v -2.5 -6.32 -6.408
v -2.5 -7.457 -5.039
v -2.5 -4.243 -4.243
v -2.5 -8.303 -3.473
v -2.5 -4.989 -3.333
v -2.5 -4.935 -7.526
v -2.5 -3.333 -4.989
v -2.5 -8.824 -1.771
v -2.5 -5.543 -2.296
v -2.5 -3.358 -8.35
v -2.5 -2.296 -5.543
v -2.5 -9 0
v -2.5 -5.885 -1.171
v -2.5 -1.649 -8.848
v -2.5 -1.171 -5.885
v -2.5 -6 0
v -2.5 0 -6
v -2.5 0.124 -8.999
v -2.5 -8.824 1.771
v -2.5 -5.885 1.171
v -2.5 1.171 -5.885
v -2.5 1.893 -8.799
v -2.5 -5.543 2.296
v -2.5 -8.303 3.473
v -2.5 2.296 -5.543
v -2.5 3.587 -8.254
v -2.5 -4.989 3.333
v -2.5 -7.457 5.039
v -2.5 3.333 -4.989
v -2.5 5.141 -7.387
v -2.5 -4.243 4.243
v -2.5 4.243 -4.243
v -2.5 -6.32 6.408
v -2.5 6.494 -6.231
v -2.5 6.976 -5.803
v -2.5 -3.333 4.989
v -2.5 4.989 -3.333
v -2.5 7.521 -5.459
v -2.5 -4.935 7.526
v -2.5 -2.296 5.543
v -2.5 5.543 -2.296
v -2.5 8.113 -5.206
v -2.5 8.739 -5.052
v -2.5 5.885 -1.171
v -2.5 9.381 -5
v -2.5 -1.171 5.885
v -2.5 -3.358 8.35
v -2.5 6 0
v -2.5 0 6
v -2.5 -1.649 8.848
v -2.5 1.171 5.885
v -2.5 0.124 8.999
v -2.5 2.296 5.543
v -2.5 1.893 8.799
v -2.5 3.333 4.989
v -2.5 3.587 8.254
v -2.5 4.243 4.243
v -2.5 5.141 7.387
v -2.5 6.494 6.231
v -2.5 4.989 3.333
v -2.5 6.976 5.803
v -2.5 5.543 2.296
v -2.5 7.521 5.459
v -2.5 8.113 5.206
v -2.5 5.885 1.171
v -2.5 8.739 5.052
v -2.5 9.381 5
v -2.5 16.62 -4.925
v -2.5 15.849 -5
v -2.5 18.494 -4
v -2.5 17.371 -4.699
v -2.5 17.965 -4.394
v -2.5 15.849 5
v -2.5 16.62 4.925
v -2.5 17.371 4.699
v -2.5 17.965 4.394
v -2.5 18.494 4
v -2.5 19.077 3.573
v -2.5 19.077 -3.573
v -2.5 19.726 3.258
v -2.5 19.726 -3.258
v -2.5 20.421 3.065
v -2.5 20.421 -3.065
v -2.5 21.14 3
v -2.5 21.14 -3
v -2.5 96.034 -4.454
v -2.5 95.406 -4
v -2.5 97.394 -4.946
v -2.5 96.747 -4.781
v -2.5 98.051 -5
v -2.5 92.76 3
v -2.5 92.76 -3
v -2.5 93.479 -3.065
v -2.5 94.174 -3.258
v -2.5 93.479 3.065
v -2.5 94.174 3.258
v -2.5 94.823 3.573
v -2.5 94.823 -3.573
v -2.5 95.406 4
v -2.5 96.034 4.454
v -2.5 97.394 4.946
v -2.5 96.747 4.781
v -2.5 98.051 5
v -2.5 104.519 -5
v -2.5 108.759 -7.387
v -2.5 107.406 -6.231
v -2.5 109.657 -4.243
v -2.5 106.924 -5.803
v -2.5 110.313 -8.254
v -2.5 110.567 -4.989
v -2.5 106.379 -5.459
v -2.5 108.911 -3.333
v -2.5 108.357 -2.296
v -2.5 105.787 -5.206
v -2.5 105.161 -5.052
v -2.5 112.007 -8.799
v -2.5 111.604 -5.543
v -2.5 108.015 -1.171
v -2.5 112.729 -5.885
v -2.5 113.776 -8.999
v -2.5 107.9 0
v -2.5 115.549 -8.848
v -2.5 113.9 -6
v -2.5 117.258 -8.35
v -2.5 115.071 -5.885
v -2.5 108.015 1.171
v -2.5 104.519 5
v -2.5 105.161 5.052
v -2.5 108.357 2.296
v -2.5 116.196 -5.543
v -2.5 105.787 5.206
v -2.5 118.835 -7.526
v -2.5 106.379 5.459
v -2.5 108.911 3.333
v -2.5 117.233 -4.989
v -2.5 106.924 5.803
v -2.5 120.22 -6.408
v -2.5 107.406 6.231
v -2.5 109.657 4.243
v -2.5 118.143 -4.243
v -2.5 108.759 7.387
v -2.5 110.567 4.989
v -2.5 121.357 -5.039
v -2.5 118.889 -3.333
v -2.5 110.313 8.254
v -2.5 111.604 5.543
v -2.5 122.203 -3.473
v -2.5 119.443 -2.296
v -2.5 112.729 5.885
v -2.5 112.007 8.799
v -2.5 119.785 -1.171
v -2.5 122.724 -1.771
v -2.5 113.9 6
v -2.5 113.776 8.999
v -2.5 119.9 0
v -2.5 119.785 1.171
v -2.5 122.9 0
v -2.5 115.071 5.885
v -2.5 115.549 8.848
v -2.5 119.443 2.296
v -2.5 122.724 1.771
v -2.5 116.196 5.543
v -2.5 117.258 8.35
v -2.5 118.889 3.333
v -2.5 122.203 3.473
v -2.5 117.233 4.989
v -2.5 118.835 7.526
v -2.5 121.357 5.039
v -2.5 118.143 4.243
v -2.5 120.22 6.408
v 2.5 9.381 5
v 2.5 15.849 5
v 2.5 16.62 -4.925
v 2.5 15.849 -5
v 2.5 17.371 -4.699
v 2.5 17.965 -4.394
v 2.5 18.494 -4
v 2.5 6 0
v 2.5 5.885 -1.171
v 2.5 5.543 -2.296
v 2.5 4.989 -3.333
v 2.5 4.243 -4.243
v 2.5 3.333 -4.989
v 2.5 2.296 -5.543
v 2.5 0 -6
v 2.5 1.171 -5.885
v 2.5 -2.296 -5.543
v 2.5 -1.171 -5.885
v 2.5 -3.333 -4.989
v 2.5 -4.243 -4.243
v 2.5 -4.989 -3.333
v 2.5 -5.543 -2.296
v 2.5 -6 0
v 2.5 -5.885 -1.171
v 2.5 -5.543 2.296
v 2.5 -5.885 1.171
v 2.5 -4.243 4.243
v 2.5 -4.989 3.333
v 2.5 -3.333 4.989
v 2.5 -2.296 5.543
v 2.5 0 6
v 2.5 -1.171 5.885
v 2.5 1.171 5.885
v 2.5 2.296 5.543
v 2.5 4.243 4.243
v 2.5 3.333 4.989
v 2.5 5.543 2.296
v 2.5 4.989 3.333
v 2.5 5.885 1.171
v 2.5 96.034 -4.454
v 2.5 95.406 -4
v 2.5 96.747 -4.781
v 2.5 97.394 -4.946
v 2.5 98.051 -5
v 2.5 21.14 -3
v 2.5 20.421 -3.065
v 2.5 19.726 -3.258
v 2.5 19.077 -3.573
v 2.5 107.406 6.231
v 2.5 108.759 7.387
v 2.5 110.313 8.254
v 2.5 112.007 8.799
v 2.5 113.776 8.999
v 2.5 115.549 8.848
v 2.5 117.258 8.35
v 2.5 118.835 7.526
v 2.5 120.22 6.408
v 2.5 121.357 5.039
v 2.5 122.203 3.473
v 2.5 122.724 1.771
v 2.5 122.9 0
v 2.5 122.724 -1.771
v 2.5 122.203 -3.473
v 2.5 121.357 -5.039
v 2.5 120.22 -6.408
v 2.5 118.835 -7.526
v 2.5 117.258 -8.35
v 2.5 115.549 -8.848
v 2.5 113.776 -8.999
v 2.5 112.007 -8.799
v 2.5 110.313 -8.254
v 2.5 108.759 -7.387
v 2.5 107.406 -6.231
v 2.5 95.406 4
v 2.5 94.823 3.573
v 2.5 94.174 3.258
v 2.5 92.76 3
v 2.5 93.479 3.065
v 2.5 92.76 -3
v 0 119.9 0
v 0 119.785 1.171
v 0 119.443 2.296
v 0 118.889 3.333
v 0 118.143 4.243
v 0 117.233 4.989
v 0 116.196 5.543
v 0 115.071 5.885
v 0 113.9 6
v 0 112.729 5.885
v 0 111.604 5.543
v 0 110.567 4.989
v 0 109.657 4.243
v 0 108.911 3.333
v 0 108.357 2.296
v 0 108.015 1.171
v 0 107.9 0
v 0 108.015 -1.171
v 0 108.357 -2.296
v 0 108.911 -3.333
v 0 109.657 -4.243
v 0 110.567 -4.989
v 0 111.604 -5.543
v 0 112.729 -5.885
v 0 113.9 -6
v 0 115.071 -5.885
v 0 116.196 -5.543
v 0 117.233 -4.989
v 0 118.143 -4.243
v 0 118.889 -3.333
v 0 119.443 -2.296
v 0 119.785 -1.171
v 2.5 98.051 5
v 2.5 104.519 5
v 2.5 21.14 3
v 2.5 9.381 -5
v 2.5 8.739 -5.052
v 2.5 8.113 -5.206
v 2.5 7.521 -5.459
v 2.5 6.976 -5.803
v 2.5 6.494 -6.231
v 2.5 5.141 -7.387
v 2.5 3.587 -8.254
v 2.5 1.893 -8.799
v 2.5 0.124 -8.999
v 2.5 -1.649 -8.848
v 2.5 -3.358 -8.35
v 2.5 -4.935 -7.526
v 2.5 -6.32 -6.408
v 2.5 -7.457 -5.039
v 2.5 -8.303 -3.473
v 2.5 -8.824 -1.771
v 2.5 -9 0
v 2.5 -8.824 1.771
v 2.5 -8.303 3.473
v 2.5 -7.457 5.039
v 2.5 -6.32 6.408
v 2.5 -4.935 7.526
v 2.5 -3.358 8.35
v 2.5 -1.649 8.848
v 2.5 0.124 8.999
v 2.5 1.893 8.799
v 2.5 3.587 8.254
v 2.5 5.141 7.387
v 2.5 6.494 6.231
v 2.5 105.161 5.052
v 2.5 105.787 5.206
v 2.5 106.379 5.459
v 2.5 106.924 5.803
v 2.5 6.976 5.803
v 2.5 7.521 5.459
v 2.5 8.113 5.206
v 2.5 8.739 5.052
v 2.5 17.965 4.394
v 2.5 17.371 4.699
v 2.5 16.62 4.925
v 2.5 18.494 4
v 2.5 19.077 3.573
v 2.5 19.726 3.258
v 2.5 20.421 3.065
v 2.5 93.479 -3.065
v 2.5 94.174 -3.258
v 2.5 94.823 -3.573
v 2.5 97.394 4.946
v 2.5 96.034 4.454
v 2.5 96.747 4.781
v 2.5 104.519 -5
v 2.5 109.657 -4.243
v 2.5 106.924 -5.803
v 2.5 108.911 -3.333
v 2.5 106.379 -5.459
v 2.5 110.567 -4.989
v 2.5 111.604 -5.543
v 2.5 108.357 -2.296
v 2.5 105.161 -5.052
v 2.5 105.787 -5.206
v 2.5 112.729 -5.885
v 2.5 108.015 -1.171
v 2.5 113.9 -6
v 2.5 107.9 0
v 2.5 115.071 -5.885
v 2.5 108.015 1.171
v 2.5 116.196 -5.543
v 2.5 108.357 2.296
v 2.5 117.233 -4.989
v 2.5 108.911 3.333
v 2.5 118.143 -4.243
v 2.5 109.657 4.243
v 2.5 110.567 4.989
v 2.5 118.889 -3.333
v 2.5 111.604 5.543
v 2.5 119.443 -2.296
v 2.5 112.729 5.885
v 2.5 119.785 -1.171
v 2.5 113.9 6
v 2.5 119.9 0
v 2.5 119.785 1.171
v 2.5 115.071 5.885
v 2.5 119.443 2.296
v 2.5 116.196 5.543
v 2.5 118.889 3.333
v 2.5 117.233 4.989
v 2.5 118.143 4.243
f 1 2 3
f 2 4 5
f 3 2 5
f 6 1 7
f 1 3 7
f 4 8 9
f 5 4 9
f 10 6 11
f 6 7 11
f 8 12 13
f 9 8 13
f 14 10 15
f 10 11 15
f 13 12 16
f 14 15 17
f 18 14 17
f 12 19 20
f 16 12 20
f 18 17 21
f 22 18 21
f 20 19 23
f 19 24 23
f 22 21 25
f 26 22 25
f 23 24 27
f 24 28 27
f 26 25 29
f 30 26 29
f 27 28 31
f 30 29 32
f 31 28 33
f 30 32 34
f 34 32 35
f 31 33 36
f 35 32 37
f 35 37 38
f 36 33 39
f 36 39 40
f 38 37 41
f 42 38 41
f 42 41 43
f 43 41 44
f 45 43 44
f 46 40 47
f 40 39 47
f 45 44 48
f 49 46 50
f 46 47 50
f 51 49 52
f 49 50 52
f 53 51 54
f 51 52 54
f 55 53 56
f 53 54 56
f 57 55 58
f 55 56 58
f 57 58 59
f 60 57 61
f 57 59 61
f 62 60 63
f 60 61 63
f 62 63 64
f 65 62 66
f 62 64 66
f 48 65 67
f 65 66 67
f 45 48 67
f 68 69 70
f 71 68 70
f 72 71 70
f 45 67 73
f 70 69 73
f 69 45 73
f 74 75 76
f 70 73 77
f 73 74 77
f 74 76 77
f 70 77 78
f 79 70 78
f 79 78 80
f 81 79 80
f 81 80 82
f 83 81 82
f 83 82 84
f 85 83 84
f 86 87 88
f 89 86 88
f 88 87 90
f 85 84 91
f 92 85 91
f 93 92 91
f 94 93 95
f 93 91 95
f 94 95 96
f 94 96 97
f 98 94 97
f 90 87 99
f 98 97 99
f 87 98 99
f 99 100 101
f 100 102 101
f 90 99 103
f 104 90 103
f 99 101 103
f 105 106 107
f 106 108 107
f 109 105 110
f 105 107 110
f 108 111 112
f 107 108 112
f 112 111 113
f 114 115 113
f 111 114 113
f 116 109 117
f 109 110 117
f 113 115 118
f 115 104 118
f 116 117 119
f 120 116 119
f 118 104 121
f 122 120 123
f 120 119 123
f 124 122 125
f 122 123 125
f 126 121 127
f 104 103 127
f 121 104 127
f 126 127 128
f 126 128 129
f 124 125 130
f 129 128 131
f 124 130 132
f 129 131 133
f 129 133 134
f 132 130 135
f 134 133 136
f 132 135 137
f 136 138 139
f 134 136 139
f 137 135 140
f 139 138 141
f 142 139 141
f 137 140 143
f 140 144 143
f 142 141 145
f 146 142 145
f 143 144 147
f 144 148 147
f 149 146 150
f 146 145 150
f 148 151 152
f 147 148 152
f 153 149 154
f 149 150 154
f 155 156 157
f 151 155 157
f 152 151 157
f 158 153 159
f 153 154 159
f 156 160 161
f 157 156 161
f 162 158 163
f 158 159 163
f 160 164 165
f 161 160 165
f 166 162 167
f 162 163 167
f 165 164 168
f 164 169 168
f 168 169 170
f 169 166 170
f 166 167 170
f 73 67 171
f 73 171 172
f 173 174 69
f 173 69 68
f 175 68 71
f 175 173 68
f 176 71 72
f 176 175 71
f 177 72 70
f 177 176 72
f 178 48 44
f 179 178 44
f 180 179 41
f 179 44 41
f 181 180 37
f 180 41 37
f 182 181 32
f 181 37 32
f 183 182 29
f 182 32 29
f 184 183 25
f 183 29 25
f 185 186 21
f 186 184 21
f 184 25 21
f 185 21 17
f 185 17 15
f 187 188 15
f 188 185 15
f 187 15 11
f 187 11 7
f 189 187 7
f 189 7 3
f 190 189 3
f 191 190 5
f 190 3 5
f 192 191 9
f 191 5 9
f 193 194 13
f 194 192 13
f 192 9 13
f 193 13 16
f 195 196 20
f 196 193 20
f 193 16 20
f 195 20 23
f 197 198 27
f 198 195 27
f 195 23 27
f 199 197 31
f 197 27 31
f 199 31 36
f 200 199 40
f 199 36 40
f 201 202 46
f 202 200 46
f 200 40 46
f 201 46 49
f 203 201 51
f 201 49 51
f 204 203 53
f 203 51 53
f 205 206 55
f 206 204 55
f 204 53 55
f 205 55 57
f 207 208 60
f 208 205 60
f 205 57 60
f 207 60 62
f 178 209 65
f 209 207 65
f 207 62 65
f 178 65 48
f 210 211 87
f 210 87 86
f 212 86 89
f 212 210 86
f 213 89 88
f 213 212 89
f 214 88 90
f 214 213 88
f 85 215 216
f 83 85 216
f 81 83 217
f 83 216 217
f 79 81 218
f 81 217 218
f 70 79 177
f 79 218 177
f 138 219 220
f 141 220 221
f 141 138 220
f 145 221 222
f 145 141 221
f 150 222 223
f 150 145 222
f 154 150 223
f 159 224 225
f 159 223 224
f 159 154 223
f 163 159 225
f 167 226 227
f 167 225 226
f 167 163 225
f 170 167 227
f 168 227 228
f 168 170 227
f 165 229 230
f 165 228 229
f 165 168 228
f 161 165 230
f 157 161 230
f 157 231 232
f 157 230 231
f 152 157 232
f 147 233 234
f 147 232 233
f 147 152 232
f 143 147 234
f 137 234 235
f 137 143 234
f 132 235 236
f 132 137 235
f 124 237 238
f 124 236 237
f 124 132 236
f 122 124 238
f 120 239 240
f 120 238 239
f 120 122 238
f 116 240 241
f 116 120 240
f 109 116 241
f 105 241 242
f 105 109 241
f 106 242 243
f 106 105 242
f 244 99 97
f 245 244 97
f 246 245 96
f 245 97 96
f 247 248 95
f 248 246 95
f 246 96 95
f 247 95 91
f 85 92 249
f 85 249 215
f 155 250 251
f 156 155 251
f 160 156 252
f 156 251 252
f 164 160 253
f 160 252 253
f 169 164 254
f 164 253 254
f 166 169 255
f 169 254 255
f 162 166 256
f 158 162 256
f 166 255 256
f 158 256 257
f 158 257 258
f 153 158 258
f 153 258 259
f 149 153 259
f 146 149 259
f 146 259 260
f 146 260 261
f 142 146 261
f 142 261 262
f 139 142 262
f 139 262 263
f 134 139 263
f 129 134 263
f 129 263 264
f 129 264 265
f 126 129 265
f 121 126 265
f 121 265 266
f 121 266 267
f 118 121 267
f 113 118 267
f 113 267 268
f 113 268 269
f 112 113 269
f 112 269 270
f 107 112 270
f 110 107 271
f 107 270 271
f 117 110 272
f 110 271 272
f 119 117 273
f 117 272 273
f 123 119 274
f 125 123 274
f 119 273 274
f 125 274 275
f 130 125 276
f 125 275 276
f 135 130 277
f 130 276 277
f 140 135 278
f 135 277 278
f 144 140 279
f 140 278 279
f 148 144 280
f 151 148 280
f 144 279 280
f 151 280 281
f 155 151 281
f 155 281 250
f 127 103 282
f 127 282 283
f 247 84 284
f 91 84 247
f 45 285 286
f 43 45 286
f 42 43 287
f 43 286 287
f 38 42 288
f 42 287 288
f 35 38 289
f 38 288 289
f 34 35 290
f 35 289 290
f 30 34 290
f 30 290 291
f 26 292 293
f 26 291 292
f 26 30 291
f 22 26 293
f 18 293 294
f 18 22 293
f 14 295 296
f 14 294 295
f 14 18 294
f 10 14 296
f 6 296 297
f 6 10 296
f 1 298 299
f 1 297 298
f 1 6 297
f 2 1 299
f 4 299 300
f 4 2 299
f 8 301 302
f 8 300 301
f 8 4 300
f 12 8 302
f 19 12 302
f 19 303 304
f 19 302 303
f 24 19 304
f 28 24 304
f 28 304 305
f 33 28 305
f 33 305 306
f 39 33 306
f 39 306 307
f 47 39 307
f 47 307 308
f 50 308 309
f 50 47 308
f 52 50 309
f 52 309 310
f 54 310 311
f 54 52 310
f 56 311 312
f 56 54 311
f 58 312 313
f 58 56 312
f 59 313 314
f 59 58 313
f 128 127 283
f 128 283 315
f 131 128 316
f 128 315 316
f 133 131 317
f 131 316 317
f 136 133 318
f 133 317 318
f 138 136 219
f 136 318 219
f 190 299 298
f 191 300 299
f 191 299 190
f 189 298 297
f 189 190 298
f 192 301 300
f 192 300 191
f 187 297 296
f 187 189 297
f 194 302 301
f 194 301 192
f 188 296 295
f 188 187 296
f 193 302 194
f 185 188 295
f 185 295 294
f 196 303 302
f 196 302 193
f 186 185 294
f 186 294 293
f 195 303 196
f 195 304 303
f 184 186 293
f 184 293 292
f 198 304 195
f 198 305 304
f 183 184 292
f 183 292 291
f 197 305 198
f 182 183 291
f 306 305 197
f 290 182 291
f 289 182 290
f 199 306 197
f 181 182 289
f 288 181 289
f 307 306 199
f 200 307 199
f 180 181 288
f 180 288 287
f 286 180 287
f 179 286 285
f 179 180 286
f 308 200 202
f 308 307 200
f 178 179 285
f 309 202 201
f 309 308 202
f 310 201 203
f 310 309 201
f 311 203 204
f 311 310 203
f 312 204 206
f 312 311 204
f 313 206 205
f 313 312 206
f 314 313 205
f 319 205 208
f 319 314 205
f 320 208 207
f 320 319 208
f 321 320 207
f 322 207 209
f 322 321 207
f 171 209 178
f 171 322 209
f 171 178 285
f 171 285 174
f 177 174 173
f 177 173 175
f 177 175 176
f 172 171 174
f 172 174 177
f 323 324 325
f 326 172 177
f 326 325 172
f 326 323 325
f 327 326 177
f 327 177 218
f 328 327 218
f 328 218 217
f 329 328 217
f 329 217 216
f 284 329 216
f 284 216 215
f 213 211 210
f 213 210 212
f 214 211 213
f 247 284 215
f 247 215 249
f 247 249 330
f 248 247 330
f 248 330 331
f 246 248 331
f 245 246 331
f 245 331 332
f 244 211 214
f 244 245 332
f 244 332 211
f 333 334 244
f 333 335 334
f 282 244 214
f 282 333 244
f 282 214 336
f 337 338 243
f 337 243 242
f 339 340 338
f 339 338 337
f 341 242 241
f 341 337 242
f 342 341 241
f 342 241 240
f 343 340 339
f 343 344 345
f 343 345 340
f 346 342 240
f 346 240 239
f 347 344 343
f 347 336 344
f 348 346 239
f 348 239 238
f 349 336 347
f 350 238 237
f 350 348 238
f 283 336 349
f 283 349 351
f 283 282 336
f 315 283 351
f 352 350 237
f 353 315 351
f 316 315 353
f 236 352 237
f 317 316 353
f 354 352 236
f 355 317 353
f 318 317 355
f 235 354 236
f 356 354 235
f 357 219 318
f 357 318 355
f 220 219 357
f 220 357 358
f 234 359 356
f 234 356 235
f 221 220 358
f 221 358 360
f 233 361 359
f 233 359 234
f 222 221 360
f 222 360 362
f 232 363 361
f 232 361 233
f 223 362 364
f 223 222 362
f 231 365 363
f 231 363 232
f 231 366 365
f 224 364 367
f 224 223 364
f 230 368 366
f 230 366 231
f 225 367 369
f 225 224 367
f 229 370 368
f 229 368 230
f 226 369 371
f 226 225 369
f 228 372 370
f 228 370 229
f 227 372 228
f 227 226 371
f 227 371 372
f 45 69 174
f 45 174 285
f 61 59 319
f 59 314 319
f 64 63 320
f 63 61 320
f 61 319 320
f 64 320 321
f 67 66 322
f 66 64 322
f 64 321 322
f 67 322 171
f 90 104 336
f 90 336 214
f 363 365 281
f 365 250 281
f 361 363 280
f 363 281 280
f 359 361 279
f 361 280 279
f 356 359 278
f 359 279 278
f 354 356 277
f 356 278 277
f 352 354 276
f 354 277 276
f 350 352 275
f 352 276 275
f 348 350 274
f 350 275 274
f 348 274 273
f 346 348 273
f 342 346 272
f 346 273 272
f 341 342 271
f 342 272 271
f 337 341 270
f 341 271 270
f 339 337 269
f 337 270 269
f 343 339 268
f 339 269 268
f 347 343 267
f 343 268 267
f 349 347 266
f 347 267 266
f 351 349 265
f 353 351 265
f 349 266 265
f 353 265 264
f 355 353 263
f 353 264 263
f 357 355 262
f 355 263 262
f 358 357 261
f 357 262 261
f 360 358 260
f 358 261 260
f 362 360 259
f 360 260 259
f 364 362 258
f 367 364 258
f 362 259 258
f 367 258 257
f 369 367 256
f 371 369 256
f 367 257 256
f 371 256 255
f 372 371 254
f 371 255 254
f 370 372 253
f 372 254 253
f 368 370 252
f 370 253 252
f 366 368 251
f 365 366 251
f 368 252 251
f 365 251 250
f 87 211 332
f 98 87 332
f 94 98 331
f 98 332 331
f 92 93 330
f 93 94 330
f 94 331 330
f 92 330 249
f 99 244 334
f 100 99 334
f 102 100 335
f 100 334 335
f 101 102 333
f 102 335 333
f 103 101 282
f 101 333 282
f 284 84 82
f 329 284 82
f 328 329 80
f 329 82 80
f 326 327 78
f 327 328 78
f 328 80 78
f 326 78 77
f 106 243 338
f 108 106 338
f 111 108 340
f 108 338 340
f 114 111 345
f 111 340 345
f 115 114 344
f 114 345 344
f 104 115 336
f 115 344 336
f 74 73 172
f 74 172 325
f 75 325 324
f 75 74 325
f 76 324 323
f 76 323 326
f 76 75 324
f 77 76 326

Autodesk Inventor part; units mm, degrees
ref_plane "YZ Plane" through (0, 0, 0) normal (1, 0, 0) x (0, 1, 0)
ref_plane "XZ Plane" through (0, 0, 0) normal (0, 1, 0) x (-1, 0, 0)
ref_plane "XY Plane" through (0, 0, 0) normal (0, 0, 1) x (1, 0, 0)
sketch "草圖1" plane through (0, 0, 0) normal (1, 0, 0) x (0, 1, 0)
  line L0 (0, 0) -> (113.9, 0)
  circle A0 centre (113.9, 0) radius 6
  circle A1 centre (0, 0) radius 6
  circle A2 centre (0, 0) radius 9
  circle A3 centre (113.9, 0) radius 9
  line L1 (7.4833, 5) -> (17.4833, 5)
  line L2 (17.4833, 5) -> (19.4833, 3)
  line L3 (19.4833, 3) -> (94.4167, 3)
  line L4 (94.4167, 3) -> (96.4167, 5)
  line L5 (96.4167, 5) -> (106.4167, 5)
  line L6 (106.4167, -5) -> (96.4167, -5)
  line L7 (96.4167, -5) -> (94.4167, -3)
  line L8 (94.4167, -3) -> (19.4833, -3)
  line L9 (19.4833, -3) -> (17.4833, -5)
  line L10 (17.4833, -5) -> (7.4833, -5)
  dimension "d0" = 113.9
  dimension "d1" = 12
  dimension "d2" = 12
  dimension "d3" = 18
  dimension "d4" = 18
  dimension "d5" = 3
  dimension "d6" = 5
  dimension "d7" = 10
  dimension "d8" = 10
extrude "擠出1" add sketch "草圖1" along normal mid plane 5
fillet "圓角1" radius 4 12 edges at (0, 106.4167, 5) (0, 96.4167, 5) (0, 94.4167, 3) (0, 17.4833, 5) (0, 7.4833, 5) (0, 19.4833, 3) (0, 7.4833, -5) (0, 17.4833, -5) (0, 19.4833, -3) (0, 106.4167, -5) (0, 96.4167, -5) (0, 94.4167, -3)
equation "\"d2\" = d1"
equation "\"d3\" = d4"
equation "\"d8\" = d7"
properties part number "Link_DE" material "ABS 塑膠"
